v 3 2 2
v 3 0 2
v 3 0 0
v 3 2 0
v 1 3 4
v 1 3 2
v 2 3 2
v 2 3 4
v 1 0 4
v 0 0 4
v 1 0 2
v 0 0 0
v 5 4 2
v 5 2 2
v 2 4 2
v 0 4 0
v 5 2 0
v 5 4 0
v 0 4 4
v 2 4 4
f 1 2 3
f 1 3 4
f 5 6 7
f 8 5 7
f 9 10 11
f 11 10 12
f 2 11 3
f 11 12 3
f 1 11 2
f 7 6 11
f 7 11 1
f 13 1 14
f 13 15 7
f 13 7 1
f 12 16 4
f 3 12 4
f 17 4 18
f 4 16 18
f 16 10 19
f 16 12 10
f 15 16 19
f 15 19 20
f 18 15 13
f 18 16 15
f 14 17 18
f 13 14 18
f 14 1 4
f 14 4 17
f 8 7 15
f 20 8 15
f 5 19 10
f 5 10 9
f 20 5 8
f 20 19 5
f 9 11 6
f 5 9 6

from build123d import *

# Parameters (mm, degrees)
F0_W     = 5
F0_H     = 4
F1_DEPTH = 2
F2_W     = 2
F2_H     = 2
F3_DEPTH = 2
F4_W     = 1
F4_H     = 4
F5_DEPTH = 2
F6_W     = 1
F6_H     = 1
F7_DEPTH = 2


with BuildPart() as f1:
    # F0 (on Top) → F1 (new body)
    with BuildSketch(Plane.XY):
        with Locations((2.5, 2)):
            Rectangle(F0_W, F0_H)
    extrude(amount=F1_DEPTH)

    # F2 (on face) → F3 (cut)
    with BuildSketch(Plane.XY.offset(2)):
        with Locations((4, 1)):
            Rectangle(F2_W, F2_H)
    extrude(amount=-F3_DEPTH, mode=Mode.SUBTRACT)

    # F4 (on face) → F5 (join)
    with BuildSketch(Plane.XY.offset(2)):
        with Locations((0.5, 2)):
            Rectangle(F4_W, F4_H)
    extrude(amount=F5_DEPTH)

    # F6 (on face) → F7 (join)
    with BuildSketch(Plane.XY.offset(2)):
        with Locations((1.5, 3.5)):
            Rectangle(F6_W, F6_H)
    extrude(amount=F7_DEPTH)


solid = f1.part
